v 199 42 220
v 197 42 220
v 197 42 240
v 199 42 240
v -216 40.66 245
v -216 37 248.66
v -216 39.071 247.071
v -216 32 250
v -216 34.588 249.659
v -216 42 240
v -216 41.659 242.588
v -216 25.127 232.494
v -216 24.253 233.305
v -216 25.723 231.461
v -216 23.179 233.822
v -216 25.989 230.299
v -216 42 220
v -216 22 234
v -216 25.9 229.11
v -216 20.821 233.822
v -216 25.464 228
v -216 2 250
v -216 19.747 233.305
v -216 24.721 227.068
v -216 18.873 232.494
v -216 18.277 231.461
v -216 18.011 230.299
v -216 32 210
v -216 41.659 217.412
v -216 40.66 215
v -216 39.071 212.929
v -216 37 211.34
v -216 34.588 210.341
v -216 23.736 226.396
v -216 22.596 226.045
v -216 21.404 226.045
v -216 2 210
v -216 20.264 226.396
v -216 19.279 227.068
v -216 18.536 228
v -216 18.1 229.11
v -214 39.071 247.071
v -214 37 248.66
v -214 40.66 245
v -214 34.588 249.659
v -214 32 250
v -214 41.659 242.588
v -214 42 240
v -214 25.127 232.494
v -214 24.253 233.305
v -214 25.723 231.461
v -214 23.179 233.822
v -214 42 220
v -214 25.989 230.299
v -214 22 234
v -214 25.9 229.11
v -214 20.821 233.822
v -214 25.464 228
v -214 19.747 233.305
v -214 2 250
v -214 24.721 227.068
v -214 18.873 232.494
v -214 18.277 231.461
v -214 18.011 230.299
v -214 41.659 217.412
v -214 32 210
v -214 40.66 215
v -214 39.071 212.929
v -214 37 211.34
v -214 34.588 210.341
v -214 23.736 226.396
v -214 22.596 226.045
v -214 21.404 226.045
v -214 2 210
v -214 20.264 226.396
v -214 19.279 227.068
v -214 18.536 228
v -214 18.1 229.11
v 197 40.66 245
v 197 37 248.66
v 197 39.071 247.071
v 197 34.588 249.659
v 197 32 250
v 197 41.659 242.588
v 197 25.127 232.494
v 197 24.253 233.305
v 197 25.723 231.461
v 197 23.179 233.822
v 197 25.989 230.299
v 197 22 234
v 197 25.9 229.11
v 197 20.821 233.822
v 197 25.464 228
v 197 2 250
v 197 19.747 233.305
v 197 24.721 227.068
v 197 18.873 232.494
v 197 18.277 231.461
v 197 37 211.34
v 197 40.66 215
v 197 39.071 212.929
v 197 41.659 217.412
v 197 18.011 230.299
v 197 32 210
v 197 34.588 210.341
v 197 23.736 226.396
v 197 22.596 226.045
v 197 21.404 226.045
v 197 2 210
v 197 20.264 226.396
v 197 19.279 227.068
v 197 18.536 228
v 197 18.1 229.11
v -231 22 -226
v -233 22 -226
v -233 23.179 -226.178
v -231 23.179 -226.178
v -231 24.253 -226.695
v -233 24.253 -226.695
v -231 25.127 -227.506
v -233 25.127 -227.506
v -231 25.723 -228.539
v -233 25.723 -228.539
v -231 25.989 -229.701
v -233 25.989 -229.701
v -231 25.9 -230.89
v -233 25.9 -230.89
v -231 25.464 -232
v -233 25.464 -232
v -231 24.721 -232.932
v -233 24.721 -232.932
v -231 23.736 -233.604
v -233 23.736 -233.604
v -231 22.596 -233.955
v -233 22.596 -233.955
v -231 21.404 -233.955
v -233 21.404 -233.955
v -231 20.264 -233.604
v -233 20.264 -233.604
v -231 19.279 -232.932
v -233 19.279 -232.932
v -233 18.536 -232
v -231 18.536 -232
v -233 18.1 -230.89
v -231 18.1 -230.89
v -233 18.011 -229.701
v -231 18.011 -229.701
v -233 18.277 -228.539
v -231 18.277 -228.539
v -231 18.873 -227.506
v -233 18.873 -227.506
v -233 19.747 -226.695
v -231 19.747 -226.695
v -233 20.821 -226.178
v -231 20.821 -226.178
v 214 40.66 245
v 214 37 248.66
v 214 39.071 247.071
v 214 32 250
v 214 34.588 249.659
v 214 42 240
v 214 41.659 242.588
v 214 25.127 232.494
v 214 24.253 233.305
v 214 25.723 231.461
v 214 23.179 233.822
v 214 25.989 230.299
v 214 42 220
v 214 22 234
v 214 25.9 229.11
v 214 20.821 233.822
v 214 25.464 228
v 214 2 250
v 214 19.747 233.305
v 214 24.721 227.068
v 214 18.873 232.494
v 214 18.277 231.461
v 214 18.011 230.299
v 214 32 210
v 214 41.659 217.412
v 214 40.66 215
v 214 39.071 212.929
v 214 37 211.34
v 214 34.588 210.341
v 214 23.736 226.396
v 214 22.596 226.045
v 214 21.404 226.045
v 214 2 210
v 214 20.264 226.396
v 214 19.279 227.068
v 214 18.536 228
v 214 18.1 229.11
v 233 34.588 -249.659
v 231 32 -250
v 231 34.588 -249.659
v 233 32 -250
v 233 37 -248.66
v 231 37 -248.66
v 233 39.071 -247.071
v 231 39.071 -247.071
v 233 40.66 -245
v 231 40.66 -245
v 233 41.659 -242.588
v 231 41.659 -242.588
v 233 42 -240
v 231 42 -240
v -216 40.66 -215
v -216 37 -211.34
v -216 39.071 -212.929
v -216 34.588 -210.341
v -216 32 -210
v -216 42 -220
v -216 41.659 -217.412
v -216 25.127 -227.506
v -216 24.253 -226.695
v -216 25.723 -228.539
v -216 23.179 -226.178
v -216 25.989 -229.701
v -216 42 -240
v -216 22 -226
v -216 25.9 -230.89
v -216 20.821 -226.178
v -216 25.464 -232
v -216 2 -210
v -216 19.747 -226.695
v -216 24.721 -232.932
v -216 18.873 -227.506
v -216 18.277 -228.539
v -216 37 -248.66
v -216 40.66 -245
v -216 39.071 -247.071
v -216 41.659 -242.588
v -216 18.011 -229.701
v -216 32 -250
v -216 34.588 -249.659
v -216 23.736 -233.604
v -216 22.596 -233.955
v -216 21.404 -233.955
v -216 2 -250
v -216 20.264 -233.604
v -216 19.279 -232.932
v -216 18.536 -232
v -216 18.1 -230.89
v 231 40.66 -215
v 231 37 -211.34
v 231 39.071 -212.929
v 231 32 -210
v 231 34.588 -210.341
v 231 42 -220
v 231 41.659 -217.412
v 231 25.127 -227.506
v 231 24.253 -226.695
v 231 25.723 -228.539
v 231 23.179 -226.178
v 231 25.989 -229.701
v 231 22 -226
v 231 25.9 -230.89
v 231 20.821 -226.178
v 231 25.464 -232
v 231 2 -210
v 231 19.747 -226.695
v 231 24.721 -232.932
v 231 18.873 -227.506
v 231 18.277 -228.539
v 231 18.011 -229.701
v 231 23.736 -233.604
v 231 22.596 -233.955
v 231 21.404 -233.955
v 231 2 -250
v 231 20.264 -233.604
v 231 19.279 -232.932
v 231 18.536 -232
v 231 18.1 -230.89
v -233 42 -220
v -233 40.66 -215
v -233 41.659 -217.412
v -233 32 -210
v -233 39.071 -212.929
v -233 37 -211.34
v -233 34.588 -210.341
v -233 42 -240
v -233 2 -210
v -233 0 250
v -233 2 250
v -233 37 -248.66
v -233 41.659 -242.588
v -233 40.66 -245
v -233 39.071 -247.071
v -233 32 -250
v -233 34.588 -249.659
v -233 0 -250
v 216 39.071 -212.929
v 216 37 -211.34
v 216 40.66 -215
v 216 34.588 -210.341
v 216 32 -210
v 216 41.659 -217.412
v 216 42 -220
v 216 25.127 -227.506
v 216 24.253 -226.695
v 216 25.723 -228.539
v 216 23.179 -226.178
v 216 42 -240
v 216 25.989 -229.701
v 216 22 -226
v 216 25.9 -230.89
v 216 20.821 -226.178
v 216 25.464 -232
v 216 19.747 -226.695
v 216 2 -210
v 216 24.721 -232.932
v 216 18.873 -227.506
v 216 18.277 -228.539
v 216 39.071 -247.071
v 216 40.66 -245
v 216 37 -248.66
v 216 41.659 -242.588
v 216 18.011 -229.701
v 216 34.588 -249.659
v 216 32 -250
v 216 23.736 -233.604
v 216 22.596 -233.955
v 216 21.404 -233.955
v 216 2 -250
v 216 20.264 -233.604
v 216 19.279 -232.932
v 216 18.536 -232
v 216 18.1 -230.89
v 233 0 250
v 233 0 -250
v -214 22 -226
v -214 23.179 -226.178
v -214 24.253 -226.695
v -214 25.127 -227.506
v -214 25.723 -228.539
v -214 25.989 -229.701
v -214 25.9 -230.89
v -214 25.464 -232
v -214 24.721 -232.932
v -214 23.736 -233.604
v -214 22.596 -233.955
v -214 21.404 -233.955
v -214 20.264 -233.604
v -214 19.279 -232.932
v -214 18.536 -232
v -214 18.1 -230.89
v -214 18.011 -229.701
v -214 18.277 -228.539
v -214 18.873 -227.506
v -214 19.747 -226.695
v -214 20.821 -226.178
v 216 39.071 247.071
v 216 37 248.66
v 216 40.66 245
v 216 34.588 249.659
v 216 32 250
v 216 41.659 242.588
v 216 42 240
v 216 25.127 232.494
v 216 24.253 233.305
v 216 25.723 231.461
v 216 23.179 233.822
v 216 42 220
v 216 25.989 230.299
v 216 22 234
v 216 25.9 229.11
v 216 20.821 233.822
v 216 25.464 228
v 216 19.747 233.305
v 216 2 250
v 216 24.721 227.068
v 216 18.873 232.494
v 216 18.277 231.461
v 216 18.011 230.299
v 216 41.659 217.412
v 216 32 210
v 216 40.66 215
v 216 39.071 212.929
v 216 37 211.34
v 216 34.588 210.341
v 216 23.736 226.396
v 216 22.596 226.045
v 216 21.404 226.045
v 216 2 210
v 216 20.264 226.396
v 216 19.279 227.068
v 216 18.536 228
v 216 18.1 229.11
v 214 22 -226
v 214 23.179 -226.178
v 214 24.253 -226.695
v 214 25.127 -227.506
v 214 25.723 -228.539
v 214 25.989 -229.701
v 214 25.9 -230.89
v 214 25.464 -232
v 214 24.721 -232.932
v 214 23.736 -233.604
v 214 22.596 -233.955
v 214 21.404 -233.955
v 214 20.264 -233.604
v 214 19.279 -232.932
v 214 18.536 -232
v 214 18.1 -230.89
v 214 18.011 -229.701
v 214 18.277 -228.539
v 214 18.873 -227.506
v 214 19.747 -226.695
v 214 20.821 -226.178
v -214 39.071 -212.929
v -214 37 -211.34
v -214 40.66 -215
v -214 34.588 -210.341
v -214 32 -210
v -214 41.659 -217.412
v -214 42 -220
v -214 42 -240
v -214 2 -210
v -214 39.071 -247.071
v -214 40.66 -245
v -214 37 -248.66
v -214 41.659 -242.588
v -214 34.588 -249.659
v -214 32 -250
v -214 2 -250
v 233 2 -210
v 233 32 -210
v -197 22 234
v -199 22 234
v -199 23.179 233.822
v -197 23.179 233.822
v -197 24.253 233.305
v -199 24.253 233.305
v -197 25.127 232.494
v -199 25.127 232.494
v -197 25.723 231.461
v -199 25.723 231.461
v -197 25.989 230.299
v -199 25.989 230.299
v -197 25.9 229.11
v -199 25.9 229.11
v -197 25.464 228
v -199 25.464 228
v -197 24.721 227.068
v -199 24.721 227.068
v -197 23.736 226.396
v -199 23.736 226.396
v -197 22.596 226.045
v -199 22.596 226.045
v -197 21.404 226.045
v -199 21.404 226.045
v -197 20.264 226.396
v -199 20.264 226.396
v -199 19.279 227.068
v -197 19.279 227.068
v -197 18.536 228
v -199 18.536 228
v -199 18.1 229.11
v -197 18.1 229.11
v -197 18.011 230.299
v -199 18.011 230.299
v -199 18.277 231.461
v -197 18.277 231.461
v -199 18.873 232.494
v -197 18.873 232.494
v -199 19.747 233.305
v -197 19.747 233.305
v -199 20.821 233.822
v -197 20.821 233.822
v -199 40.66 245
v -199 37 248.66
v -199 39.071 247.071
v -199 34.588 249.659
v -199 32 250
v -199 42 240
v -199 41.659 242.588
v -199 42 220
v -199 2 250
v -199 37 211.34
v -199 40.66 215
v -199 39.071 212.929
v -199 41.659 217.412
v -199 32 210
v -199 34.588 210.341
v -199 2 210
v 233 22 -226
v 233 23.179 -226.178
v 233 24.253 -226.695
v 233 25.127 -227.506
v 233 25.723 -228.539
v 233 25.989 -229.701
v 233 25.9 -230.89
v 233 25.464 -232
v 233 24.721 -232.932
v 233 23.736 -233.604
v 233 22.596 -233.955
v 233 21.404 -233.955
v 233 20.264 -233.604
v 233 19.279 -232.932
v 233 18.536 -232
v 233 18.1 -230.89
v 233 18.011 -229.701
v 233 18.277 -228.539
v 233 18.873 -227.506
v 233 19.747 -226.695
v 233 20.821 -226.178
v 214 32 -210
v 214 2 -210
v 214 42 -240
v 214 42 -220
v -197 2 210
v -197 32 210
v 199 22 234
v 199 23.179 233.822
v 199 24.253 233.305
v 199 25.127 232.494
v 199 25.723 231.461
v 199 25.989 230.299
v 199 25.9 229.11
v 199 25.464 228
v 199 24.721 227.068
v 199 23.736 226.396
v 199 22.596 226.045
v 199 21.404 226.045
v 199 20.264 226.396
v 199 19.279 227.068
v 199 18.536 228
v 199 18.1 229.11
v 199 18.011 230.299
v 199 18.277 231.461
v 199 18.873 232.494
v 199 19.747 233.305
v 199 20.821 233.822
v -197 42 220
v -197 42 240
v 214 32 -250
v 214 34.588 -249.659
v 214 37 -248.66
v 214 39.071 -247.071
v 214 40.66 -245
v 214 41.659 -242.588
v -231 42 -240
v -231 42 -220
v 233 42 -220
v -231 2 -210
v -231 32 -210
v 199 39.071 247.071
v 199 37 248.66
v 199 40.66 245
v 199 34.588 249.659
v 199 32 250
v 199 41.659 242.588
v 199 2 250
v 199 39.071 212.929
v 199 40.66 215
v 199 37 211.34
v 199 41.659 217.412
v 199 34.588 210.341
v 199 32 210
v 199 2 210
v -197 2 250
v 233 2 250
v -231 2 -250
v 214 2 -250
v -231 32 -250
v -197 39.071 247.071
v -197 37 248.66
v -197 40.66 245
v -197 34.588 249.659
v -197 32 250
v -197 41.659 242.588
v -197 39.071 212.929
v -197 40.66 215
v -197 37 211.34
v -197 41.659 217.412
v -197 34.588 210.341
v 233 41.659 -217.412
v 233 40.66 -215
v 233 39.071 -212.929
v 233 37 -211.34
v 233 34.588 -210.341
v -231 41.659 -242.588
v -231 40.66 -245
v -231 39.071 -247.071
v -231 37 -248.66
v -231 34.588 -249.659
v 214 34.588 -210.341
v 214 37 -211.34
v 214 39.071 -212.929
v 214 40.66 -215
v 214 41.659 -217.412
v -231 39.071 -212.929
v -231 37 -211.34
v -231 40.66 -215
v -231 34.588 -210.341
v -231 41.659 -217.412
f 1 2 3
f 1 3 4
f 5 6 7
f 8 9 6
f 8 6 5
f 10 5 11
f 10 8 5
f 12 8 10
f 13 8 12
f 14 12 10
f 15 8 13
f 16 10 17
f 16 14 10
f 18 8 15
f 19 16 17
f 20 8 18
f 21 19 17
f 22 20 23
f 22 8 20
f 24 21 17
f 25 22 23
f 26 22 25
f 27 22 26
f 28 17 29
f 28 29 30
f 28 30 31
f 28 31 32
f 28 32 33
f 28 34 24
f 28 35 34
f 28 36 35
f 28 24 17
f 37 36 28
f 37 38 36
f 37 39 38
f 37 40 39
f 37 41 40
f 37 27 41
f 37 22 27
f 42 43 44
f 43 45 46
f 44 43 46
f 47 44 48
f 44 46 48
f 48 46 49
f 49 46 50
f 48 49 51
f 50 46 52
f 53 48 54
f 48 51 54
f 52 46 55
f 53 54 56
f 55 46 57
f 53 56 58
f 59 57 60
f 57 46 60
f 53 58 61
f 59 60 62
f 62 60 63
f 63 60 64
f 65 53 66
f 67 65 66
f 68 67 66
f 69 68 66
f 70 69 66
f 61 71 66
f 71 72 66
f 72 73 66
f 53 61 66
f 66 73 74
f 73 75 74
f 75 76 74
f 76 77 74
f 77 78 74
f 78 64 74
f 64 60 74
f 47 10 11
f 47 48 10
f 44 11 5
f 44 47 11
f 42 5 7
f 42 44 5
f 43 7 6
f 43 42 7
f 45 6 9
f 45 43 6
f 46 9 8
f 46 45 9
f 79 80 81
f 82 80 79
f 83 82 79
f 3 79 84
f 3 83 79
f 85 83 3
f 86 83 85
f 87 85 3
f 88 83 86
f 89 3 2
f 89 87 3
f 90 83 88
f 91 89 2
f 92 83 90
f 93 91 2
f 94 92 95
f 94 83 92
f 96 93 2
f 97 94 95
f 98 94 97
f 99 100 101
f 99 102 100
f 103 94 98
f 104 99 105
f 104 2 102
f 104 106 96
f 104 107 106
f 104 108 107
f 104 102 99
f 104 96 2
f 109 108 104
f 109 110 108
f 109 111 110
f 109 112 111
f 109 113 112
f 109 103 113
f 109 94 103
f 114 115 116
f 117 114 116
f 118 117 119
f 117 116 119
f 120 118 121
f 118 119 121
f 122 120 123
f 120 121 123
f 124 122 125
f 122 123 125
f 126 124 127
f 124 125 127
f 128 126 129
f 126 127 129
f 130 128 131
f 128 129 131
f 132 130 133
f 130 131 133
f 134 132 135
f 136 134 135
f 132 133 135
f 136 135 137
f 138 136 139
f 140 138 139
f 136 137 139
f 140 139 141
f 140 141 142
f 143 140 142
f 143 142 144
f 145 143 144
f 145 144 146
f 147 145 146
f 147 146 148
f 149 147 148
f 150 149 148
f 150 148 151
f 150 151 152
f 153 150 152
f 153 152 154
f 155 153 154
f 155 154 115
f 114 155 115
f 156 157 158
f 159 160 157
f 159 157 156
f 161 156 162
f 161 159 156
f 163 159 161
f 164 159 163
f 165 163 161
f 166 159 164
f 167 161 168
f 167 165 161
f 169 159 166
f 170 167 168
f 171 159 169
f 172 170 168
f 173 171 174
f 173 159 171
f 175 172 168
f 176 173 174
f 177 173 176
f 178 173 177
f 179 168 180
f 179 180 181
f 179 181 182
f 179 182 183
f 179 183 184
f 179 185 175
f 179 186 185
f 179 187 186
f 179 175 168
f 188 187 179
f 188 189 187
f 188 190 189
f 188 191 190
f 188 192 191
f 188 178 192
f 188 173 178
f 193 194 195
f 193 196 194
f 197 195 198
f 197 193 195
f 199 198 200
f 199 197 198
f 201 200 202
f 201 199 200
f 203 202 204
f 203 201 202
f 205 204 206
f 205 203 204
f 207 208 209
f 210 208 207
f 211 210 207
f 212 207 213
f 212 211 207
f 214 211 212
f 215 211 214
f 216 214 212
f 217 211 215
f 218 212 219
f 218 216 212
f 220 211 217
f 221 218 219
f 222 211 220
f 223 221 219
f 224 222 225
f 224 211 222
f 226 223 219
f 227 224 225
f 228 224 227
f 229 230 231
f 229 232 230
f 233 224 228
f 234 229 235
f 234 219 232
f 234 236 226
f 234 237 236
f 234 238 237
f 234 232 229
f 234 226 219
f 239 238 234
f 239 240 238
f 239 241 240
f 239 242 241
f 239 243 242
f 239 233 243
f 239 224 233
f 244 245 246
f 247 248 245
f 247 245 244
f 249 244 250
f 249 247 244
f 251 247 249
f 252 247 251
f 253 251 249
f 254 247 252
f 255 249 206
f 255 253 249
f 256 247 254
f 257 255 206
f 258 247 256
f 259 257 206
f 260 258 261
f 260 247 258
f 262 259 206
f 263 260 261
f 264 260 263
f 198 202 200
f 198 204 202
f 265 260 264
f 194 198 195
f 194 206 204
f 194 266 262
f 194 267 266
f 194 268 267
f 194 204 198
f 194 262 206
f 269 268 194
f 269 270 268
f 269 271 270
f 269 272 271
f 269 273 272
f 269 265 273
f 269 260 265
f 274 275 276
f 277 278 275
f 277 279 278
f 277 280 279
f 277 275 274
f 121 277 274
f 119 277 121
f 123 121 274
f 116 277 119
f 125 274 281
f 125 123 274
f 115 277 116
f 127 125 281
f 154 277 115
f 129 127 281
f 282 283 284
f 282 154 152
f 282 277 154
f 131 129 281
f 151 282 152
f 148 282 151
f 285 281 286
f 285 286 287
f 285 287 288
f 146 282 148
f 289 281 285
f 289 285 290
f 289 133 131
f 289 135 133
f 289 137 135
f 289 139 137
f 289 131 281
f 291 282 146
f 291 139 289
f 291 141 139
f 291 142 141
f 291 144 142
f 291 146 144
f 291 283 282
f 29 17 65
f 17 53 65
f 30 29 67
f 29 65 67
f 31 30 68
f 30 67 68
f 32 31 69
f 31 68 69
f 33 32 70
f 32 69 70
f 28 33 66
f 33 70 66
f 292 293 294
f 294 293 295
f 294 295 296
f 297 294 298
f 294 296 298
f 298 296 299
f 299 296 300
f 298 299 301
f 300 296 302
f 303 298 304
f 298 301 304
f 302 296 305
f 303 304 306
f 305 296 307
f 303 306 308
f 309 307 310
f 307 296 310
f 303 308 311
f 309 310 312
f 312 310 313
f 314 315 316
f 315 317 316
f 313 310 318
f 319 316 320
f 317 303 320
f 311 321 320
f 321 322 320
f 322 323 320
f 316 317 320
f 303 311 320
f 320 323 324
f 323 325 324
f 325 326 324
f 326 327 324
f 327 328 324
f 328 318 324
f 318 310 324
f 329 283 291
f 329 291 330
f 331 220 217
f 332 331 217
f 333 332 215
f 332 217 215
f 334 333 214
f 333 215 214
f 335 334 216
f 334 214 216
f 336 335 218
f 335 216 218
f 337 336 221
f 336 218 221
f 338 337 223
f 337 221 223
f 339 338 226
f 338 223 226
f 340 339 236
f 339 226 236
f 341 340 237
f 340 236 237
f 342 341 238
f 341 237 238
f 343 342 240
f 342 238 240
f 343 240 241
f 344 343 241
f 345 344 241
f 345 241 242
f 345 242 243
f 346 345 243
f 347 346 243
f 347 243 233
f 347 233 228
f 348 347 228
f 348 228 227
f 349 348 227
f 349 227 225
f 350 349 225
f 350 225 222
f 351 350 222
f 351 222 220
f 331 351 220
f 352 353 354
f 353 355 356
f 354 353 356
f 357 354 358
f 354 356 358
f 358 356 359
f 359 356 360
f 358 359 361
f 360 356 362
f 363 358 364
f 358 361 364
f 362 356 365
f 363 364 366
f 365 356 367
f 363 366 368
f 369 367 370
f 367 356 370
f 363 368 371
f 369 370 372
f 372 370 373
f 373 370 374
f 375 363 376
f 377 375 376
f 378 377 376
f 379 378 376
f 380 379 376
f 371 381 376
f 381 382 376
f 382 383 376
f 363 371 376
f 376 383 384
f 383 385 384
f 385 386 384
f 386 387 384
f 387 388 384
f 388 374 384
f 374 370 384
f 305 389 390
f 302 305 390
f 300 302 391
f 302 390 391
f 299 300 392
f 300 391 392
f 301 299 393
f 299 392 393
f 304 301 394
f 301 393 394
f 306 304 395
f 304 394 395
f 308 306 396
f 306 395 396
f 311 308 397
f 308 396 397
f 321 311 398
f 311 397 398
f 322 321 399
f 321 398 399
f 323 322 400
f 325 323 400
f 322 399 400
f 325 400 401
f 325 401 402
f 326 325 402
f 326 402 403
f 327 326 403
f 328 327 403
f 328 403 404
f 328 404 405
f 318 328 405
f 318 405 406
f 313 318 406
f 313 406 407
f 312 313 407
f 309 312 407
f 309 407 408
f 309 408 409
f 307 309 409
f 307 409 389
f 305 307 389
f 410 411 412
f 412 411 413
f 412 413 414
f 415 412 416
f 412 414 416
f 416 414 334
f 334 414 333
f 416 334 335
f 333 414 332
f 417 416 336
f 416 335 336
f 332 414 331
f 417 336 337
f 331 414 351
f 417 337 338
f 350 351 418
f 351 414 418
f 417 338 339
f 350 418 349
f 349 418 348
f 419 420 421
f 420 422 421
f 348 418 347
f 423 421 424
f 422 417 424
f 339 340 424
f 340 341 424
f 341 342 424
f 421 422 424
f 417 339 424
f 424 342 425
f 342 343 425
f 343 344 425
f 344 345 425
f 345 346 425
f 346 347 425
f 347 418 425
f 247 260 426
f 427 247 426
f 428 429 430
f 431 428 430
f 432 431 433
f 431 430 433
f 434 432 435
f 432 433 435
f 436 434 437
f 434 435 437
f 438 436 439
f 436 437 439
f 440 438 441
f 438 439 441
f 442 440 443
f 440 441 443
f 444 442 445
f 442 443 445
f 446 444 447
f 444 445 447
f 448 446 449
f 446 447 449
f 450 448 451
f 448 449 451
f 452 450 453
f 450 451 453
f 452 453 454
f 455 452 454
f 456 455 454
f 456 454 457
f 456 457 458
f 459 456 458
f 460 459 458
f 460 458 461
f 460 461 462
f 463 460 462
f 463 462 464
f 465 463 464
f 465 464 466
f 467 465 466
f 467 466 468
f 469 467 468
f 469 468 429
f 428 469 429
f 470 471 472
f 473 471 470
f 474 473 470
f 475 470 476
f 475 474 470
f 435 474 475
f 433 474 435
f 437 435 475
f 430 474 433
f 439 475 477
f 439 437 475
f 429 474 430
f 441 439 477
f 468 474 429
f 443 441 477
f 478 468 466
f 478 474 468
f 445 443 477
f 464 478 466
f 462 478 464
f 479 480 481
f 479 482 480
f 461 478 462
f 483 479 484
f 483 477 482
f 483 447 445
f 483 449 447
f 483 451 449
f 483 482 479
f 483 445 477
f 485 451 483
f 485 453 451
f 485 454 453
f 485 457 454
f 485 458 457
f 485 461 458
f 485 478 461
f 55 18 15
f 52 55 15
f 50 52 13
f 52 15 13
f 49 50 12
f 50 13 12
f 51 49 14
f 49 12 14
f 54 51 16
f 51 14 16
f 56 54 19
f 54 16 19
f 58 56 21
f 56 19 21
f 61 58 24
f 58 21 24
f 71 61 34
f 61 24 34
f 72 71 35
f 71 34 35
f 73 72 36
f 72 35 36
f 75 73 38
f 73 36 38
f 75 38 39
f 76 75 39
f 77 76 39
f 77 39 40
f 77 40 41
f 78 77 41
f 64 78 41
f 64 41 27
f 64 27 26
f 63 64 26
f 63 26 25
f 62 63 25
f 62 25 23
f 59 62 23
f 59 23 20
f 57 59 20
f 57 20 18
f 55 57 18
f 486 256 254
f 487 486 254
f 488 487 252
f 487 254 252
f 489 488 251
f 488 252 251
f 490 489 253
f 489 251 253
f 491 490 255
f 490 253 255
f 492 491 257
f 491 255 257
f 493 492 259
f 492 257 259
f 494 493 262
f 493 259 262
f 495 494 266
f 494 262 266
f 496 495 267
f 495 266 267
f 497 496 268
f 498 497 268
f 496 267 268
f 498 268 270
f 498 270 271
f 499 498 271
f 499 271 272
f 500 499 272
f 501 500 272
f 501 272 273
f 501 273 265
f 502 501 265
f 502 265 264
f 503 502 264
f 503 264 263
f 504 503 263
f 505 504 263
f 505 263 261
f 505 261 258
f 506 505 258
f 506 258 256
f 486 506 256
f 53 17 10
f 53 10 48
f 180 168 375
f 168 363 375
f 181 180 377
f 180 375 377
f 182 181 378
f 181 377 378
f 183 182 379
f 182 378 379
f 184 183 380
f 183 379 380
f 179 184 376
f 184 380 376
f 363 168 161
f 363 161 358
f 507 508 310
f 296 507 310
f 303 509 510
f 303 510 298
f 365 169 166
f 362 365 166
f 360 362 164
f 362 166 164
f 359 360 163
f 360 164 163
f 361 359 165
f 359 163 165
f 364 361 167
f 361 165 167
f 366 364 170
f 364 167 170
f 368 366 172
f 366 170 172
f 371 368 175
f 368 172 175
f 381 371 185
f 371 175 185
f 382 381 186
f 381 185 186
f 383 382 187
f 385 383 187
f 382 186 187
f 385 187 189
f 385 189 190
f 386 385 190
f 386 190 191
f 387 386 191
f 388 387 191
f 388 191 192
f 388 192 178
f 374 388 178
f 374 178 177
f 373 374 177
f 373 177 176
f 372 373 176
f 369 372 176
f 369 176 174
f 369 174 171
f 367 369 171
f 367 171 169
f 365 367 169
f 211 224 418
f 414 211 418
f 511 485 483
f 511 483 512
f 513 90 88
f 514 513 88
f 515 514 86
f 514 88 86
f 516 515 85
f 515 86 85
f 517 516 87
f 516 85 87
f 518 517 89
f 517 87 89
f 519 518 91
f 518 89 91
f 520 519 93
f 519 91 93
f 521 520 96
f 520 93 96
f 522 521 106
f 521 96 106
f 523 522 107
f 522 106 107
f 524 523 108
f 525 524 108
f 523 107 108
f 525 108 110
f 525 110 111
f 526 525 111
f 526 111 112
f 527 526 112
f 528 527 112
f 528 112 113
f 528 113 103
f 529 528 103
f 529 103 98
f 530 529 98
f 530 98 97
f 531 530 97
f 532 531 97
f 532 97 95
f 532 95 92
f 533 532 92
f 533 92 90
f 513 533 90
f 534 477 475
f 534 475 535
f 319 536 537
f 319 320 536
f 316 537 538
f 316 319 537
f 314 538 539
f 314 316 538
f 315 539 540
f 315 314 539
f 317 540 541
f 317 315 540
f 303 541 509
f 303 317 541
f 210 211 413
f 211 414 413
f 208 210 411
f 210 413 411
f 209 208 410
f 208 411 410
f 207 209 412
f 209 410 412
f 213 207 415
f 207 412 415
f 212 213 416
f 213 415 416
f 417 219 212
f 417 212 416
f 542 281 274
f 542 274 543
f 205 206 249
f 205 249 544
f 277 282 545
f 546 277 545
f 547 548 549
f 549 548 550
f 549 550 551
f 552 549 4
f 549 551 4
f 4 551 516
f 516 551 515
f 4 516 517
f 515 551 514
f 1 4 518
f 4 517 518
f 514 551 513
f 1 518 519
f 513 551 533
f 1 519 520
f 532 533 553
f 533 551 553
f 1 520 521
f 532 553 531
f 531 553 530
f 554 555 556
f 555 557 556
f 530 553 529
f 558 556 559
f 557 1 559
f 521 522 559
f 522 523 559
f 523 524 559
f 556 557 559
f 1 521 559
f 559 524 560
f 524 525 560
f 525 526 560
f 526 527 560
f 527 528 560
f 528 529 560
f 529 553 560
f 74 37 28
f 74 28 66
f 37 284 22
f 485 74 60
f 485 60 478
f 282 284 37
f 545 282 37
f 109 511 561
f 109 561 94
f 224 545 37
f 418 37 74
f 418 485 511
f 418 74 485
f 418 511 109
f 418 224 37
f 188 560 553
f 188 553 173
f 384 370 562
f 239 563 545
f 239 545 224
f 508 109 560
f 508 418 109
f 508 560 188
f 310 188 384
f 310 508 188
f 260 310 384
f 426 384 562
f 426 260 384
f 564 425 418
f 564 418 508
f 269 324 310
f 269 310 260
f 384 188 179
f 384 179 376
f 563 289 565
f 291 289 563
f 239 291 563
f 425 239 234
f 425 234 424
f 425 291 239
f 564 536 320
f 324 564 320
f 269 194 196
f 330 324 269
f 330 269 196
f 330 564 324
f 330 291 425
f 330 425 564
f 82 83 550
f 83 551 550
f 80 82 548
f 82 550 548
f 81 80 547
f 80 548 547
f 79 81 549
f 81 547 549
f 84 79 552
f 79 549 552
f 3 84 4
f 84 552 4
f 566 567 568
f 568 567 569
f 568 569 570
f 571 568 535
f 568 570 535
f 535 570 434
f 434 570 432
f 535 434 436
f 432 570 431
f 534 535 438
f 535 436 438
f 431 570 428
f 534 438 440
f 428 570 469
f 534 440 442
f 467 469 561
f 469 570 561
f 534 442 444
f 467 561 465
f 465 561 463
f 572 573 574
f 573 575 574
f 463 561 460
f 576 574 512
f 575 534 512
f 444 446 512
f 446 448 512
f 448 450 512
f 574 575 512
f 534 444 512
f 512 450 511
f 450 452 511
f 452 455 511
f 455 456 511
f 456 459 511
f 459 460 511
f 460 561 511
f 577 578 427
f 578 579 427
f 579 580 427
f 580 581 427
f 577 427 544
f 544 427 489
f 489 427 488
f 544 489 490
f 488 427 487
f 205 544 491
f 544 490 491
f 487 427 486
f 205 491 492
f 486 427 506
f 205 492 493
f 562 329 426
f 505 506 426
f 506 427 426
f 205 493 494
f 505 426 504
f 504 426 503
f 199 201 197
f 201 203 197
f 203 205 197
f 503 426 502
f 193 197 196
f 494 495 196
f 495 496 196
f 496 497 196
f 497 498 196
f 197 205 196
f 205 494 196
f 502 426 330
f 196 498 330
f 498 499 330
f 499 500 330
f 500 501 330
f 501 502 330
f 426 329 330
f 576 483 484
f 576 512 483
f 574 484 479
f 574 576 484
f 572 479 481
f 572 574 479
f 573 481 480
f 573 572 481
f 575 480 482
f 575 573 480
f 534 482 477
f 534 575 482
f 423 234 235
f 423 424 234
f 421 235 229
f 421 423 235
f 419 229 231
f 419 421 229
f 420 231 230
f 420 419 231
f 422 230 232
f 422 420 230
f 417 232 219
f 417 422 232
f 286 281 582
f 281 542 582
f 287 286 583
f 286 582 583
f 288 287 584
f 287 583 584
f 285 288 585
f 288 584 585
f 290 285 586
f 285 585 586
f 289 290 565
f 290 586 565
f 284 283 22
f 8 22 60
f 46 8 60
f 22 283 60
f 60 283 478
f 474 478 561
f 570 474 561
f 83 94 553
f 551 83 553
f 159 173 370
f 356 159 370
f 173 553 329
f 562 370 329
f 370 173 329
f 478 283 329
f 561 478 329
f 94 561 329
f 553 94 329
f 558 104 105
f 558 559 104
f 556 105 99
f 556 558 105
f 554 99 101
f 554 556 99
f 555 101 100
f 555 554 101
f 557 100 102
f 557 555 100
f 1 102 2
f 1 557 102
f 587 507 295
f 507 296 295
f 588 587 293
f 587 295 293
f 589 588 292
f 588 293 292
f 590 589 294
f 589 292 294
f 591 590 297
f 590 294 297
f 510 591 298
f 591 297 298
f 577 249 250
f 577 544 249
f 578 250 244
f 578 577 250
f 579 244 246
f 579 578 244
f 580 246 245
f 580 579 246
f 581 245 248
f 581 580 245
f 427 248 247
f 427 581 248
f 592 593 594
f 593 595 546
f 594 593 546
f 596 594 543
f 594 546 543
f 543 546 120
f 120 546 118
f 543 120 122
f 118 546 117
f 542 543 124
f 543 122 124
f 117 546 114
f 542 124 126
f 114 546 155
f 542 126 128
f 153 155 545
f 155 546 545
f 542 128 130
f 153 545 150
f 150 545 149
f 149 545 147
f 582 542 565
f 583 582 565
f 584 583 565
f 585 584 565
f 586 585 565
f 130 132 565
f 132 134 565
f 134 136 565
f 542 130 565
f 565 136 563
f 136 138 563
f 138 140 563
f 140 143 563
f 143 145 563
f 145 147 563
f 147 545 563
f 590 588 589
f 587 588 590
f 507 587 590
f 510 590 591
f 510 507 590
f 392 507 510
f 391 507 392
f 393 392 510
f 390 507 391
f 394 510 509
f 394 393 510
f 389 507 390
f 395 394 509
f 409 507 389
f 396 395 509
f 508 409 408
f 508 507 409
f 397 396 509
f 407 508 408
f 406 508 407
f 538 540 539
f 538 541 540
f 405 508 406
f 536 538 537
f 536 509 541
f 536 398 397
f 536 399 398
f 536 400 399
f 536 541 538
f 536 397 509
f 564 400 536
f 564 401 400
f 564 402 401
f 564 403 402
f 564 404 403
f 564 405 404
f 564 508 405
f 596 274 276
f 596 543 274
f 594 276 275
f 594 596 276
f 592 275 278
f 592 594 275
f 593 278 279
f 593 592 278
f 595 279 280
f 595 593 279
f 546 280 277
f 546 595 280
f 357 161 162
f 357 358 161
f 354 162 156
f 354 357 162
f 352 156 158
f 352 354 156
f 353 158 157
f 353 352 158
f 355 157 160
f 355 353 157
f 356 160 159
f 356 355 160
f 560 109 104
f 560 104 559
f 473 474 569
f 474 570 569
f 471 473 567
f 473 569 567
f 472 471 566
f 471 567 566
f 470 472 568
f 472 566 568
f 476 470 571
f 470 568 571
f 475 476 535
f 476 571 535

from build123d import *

# Parameters (mm, degrees)
SKETCH1_W               = 466
SKETCH1_H               = 500
BOSS_EXTRUDE1_DEPTH     = 2
SKETCH2_W               = 2
SKETCH2_H               = 40
BOSS_EXTRUDE2_DEPTH     = 40
FILLET1_R               = 10
SKETCH3_R               = 4
CUT_EXTRUDE1_DEPTH      = 531.490339215
CROQUIS2_W              = 40
CROQUIS2_H              = 40
CORTAR_EXTRUIR1_DEPTH   = 10
CROQUIS3_W              = 40
CROQUIS3_H              = 40
CORTAR_EXTRUIR2_DEPTH   = 10
CROQUIS4_W              = 2
CROQUIS4_H              = 40
SALIENTE_EXTRUIR1_DEPTH = 40
CROQUIS5_R              = 4
CORTAR_EXTRUIR3_DEPTH   = 516.620984833
REDONDEO1_R             = 10


with BuildPart() as part:
    # Sketch1 → Boss-Extrude1 (new body)
    with BuildSketch(Plane(origin=(0, 0, 0), x_dir=(1, 0, 0), z_dir=(0, 1, 0))):
        Rectangle(SKETCH1_W, SKETCH1_H)
    extrude(amount=BOSS_EXTRUDE1_DEPTH)

    # Sketch2 → Boss-Extrude2 (add)
    with BuildSketch(Plane(origin=(0, 2, 0), x_dir=(1, 0, 0), z_dir=(0, 1, 0))):
        with Locations((232, -230)):
            Rectangle(SKETCH2_W, SKETCH2_H)
        with Locations((232, 230)):
            Rectangle(SKETCH2_W, SKETCH2_H)
        with Locations((-232, 230)):
            Rectangle(SKETCH2_W, SKETCH2_H)
        with Locations((-232, -230)):
            Rectangle(SKETCH2_W, SKETCH2_H)
        with Locations((215, -230)):
            Rectangle(SKETCH2_W, SKETCH2_H)
        with Locations((-215, -230)):
            Rectangle(SKETCH2_W, SKETCH2_H)
        with Locations((-215, 230)):
            Rectangle(SKETCH2_W, SKETCH2_H)
        with Locations((215, 230)):
            Rectangle(SKETCH2_W, SKETCH2_H)
    extrude(amount=BOSS_EXTRUDE2_DEPTH)

    # Fillet1
    fillet1_edges = [part.edges().sort_by_distance(p)[0] for p in [
        (232, 42, 210),
        (232, 42, 250),
        (232, 42, -250),
        (232, 42, -210),
        (-232, 42, -250),
        (-232, 42, -210),
        (-232, 42, 250),
        (-232, 42, 210),
        (-215, 42, 250),
        (-215, 42, 210),
        (215, 42, 210),
        (215, 42, 250),
        (-215, 42, -210),
        (-215, 42, -250),
        (215, 42, -210),
        (215, 42, -250),
    ]]
    fillet(fillet1_edges, radius=FILLET1_R)

    # Sketch3 → Cut-Extrude1 (cut, through all)
    with BuildSketch(Plane.ZY.offset(233)):
        with Locations((-230, 22)):
            Circle(SKETCH3_R)
        with Locations((230, 22)):
            Circle(SKETCH3_R)
    extrude(amount=-CUT_EXTRUDE1_DEPTH, mode=Mode.SUBTRACT)

    # Croquis2 → Cortar-Extruir1 (cut)
    with BuildSketch(Plane.ZY.offset(233)):
        with Locations((230, 22)):
            Rectangle(CROQUIS2_W, CROQUIS2_H)
    extrude(amount=-CORTAR_EXTRUIR1_DEPTH, mode=Mode.SUBTRACT)

    # Croquis3 → Cortar-Extruir2 (cut)
    with BuildSketch(Plane(origin=(233, 0, 0), x_dir=(0, 0, -1), z_dir=(1, 0, 0))):
        with Locations((-230, 22)):
            Rectangle(CROQUIS3_W, CROQUIS3_H)
    extrude(amount=-CORTAR_EXTRUIR2_DEPTH, mode=Mode.SUBTRACT)

    # Croquis4 → Saliente-Extruir1 (add)
    with BuildSketch(Plane(origin=(0, 2, 0), x_dir=(1, 0, 0), z_dir=(0, 1, 0))):
        with Locations((-198, -230)):
            Rectangle(CROQUIS4_W, CROQUIS4_H)
        with Locations((198, -230)):
            Rectangle(CROQUIS4_W, CROQUIS4_H)
    extrude(amount=SALIENTE_EXTRUIR1_DEPTH)

    # Croquis5 → Cortar-Extruir3 (cut, through all)
    with BuildSketch(Plane.ZY.offset(216)):
        with Locations((230, 22)):
            Circle(CROQUIS5_R)
    extrude(amount=-CORTAR_EXTRUIR3_DEPTH, mode=Mode.SUBTRACT)

    # Redondeo1
    redondeo1_edges = [part.edges().sort_by_distance(p)[0] for p in [
        (-198, 42, 250),
        (-198, 42, 210),
        (198, 42, 210),
        (198, 42, 250),
    ]]
    fillet(redondeo1_edges, radius=REDONDEO1_R)


solid = part.part
